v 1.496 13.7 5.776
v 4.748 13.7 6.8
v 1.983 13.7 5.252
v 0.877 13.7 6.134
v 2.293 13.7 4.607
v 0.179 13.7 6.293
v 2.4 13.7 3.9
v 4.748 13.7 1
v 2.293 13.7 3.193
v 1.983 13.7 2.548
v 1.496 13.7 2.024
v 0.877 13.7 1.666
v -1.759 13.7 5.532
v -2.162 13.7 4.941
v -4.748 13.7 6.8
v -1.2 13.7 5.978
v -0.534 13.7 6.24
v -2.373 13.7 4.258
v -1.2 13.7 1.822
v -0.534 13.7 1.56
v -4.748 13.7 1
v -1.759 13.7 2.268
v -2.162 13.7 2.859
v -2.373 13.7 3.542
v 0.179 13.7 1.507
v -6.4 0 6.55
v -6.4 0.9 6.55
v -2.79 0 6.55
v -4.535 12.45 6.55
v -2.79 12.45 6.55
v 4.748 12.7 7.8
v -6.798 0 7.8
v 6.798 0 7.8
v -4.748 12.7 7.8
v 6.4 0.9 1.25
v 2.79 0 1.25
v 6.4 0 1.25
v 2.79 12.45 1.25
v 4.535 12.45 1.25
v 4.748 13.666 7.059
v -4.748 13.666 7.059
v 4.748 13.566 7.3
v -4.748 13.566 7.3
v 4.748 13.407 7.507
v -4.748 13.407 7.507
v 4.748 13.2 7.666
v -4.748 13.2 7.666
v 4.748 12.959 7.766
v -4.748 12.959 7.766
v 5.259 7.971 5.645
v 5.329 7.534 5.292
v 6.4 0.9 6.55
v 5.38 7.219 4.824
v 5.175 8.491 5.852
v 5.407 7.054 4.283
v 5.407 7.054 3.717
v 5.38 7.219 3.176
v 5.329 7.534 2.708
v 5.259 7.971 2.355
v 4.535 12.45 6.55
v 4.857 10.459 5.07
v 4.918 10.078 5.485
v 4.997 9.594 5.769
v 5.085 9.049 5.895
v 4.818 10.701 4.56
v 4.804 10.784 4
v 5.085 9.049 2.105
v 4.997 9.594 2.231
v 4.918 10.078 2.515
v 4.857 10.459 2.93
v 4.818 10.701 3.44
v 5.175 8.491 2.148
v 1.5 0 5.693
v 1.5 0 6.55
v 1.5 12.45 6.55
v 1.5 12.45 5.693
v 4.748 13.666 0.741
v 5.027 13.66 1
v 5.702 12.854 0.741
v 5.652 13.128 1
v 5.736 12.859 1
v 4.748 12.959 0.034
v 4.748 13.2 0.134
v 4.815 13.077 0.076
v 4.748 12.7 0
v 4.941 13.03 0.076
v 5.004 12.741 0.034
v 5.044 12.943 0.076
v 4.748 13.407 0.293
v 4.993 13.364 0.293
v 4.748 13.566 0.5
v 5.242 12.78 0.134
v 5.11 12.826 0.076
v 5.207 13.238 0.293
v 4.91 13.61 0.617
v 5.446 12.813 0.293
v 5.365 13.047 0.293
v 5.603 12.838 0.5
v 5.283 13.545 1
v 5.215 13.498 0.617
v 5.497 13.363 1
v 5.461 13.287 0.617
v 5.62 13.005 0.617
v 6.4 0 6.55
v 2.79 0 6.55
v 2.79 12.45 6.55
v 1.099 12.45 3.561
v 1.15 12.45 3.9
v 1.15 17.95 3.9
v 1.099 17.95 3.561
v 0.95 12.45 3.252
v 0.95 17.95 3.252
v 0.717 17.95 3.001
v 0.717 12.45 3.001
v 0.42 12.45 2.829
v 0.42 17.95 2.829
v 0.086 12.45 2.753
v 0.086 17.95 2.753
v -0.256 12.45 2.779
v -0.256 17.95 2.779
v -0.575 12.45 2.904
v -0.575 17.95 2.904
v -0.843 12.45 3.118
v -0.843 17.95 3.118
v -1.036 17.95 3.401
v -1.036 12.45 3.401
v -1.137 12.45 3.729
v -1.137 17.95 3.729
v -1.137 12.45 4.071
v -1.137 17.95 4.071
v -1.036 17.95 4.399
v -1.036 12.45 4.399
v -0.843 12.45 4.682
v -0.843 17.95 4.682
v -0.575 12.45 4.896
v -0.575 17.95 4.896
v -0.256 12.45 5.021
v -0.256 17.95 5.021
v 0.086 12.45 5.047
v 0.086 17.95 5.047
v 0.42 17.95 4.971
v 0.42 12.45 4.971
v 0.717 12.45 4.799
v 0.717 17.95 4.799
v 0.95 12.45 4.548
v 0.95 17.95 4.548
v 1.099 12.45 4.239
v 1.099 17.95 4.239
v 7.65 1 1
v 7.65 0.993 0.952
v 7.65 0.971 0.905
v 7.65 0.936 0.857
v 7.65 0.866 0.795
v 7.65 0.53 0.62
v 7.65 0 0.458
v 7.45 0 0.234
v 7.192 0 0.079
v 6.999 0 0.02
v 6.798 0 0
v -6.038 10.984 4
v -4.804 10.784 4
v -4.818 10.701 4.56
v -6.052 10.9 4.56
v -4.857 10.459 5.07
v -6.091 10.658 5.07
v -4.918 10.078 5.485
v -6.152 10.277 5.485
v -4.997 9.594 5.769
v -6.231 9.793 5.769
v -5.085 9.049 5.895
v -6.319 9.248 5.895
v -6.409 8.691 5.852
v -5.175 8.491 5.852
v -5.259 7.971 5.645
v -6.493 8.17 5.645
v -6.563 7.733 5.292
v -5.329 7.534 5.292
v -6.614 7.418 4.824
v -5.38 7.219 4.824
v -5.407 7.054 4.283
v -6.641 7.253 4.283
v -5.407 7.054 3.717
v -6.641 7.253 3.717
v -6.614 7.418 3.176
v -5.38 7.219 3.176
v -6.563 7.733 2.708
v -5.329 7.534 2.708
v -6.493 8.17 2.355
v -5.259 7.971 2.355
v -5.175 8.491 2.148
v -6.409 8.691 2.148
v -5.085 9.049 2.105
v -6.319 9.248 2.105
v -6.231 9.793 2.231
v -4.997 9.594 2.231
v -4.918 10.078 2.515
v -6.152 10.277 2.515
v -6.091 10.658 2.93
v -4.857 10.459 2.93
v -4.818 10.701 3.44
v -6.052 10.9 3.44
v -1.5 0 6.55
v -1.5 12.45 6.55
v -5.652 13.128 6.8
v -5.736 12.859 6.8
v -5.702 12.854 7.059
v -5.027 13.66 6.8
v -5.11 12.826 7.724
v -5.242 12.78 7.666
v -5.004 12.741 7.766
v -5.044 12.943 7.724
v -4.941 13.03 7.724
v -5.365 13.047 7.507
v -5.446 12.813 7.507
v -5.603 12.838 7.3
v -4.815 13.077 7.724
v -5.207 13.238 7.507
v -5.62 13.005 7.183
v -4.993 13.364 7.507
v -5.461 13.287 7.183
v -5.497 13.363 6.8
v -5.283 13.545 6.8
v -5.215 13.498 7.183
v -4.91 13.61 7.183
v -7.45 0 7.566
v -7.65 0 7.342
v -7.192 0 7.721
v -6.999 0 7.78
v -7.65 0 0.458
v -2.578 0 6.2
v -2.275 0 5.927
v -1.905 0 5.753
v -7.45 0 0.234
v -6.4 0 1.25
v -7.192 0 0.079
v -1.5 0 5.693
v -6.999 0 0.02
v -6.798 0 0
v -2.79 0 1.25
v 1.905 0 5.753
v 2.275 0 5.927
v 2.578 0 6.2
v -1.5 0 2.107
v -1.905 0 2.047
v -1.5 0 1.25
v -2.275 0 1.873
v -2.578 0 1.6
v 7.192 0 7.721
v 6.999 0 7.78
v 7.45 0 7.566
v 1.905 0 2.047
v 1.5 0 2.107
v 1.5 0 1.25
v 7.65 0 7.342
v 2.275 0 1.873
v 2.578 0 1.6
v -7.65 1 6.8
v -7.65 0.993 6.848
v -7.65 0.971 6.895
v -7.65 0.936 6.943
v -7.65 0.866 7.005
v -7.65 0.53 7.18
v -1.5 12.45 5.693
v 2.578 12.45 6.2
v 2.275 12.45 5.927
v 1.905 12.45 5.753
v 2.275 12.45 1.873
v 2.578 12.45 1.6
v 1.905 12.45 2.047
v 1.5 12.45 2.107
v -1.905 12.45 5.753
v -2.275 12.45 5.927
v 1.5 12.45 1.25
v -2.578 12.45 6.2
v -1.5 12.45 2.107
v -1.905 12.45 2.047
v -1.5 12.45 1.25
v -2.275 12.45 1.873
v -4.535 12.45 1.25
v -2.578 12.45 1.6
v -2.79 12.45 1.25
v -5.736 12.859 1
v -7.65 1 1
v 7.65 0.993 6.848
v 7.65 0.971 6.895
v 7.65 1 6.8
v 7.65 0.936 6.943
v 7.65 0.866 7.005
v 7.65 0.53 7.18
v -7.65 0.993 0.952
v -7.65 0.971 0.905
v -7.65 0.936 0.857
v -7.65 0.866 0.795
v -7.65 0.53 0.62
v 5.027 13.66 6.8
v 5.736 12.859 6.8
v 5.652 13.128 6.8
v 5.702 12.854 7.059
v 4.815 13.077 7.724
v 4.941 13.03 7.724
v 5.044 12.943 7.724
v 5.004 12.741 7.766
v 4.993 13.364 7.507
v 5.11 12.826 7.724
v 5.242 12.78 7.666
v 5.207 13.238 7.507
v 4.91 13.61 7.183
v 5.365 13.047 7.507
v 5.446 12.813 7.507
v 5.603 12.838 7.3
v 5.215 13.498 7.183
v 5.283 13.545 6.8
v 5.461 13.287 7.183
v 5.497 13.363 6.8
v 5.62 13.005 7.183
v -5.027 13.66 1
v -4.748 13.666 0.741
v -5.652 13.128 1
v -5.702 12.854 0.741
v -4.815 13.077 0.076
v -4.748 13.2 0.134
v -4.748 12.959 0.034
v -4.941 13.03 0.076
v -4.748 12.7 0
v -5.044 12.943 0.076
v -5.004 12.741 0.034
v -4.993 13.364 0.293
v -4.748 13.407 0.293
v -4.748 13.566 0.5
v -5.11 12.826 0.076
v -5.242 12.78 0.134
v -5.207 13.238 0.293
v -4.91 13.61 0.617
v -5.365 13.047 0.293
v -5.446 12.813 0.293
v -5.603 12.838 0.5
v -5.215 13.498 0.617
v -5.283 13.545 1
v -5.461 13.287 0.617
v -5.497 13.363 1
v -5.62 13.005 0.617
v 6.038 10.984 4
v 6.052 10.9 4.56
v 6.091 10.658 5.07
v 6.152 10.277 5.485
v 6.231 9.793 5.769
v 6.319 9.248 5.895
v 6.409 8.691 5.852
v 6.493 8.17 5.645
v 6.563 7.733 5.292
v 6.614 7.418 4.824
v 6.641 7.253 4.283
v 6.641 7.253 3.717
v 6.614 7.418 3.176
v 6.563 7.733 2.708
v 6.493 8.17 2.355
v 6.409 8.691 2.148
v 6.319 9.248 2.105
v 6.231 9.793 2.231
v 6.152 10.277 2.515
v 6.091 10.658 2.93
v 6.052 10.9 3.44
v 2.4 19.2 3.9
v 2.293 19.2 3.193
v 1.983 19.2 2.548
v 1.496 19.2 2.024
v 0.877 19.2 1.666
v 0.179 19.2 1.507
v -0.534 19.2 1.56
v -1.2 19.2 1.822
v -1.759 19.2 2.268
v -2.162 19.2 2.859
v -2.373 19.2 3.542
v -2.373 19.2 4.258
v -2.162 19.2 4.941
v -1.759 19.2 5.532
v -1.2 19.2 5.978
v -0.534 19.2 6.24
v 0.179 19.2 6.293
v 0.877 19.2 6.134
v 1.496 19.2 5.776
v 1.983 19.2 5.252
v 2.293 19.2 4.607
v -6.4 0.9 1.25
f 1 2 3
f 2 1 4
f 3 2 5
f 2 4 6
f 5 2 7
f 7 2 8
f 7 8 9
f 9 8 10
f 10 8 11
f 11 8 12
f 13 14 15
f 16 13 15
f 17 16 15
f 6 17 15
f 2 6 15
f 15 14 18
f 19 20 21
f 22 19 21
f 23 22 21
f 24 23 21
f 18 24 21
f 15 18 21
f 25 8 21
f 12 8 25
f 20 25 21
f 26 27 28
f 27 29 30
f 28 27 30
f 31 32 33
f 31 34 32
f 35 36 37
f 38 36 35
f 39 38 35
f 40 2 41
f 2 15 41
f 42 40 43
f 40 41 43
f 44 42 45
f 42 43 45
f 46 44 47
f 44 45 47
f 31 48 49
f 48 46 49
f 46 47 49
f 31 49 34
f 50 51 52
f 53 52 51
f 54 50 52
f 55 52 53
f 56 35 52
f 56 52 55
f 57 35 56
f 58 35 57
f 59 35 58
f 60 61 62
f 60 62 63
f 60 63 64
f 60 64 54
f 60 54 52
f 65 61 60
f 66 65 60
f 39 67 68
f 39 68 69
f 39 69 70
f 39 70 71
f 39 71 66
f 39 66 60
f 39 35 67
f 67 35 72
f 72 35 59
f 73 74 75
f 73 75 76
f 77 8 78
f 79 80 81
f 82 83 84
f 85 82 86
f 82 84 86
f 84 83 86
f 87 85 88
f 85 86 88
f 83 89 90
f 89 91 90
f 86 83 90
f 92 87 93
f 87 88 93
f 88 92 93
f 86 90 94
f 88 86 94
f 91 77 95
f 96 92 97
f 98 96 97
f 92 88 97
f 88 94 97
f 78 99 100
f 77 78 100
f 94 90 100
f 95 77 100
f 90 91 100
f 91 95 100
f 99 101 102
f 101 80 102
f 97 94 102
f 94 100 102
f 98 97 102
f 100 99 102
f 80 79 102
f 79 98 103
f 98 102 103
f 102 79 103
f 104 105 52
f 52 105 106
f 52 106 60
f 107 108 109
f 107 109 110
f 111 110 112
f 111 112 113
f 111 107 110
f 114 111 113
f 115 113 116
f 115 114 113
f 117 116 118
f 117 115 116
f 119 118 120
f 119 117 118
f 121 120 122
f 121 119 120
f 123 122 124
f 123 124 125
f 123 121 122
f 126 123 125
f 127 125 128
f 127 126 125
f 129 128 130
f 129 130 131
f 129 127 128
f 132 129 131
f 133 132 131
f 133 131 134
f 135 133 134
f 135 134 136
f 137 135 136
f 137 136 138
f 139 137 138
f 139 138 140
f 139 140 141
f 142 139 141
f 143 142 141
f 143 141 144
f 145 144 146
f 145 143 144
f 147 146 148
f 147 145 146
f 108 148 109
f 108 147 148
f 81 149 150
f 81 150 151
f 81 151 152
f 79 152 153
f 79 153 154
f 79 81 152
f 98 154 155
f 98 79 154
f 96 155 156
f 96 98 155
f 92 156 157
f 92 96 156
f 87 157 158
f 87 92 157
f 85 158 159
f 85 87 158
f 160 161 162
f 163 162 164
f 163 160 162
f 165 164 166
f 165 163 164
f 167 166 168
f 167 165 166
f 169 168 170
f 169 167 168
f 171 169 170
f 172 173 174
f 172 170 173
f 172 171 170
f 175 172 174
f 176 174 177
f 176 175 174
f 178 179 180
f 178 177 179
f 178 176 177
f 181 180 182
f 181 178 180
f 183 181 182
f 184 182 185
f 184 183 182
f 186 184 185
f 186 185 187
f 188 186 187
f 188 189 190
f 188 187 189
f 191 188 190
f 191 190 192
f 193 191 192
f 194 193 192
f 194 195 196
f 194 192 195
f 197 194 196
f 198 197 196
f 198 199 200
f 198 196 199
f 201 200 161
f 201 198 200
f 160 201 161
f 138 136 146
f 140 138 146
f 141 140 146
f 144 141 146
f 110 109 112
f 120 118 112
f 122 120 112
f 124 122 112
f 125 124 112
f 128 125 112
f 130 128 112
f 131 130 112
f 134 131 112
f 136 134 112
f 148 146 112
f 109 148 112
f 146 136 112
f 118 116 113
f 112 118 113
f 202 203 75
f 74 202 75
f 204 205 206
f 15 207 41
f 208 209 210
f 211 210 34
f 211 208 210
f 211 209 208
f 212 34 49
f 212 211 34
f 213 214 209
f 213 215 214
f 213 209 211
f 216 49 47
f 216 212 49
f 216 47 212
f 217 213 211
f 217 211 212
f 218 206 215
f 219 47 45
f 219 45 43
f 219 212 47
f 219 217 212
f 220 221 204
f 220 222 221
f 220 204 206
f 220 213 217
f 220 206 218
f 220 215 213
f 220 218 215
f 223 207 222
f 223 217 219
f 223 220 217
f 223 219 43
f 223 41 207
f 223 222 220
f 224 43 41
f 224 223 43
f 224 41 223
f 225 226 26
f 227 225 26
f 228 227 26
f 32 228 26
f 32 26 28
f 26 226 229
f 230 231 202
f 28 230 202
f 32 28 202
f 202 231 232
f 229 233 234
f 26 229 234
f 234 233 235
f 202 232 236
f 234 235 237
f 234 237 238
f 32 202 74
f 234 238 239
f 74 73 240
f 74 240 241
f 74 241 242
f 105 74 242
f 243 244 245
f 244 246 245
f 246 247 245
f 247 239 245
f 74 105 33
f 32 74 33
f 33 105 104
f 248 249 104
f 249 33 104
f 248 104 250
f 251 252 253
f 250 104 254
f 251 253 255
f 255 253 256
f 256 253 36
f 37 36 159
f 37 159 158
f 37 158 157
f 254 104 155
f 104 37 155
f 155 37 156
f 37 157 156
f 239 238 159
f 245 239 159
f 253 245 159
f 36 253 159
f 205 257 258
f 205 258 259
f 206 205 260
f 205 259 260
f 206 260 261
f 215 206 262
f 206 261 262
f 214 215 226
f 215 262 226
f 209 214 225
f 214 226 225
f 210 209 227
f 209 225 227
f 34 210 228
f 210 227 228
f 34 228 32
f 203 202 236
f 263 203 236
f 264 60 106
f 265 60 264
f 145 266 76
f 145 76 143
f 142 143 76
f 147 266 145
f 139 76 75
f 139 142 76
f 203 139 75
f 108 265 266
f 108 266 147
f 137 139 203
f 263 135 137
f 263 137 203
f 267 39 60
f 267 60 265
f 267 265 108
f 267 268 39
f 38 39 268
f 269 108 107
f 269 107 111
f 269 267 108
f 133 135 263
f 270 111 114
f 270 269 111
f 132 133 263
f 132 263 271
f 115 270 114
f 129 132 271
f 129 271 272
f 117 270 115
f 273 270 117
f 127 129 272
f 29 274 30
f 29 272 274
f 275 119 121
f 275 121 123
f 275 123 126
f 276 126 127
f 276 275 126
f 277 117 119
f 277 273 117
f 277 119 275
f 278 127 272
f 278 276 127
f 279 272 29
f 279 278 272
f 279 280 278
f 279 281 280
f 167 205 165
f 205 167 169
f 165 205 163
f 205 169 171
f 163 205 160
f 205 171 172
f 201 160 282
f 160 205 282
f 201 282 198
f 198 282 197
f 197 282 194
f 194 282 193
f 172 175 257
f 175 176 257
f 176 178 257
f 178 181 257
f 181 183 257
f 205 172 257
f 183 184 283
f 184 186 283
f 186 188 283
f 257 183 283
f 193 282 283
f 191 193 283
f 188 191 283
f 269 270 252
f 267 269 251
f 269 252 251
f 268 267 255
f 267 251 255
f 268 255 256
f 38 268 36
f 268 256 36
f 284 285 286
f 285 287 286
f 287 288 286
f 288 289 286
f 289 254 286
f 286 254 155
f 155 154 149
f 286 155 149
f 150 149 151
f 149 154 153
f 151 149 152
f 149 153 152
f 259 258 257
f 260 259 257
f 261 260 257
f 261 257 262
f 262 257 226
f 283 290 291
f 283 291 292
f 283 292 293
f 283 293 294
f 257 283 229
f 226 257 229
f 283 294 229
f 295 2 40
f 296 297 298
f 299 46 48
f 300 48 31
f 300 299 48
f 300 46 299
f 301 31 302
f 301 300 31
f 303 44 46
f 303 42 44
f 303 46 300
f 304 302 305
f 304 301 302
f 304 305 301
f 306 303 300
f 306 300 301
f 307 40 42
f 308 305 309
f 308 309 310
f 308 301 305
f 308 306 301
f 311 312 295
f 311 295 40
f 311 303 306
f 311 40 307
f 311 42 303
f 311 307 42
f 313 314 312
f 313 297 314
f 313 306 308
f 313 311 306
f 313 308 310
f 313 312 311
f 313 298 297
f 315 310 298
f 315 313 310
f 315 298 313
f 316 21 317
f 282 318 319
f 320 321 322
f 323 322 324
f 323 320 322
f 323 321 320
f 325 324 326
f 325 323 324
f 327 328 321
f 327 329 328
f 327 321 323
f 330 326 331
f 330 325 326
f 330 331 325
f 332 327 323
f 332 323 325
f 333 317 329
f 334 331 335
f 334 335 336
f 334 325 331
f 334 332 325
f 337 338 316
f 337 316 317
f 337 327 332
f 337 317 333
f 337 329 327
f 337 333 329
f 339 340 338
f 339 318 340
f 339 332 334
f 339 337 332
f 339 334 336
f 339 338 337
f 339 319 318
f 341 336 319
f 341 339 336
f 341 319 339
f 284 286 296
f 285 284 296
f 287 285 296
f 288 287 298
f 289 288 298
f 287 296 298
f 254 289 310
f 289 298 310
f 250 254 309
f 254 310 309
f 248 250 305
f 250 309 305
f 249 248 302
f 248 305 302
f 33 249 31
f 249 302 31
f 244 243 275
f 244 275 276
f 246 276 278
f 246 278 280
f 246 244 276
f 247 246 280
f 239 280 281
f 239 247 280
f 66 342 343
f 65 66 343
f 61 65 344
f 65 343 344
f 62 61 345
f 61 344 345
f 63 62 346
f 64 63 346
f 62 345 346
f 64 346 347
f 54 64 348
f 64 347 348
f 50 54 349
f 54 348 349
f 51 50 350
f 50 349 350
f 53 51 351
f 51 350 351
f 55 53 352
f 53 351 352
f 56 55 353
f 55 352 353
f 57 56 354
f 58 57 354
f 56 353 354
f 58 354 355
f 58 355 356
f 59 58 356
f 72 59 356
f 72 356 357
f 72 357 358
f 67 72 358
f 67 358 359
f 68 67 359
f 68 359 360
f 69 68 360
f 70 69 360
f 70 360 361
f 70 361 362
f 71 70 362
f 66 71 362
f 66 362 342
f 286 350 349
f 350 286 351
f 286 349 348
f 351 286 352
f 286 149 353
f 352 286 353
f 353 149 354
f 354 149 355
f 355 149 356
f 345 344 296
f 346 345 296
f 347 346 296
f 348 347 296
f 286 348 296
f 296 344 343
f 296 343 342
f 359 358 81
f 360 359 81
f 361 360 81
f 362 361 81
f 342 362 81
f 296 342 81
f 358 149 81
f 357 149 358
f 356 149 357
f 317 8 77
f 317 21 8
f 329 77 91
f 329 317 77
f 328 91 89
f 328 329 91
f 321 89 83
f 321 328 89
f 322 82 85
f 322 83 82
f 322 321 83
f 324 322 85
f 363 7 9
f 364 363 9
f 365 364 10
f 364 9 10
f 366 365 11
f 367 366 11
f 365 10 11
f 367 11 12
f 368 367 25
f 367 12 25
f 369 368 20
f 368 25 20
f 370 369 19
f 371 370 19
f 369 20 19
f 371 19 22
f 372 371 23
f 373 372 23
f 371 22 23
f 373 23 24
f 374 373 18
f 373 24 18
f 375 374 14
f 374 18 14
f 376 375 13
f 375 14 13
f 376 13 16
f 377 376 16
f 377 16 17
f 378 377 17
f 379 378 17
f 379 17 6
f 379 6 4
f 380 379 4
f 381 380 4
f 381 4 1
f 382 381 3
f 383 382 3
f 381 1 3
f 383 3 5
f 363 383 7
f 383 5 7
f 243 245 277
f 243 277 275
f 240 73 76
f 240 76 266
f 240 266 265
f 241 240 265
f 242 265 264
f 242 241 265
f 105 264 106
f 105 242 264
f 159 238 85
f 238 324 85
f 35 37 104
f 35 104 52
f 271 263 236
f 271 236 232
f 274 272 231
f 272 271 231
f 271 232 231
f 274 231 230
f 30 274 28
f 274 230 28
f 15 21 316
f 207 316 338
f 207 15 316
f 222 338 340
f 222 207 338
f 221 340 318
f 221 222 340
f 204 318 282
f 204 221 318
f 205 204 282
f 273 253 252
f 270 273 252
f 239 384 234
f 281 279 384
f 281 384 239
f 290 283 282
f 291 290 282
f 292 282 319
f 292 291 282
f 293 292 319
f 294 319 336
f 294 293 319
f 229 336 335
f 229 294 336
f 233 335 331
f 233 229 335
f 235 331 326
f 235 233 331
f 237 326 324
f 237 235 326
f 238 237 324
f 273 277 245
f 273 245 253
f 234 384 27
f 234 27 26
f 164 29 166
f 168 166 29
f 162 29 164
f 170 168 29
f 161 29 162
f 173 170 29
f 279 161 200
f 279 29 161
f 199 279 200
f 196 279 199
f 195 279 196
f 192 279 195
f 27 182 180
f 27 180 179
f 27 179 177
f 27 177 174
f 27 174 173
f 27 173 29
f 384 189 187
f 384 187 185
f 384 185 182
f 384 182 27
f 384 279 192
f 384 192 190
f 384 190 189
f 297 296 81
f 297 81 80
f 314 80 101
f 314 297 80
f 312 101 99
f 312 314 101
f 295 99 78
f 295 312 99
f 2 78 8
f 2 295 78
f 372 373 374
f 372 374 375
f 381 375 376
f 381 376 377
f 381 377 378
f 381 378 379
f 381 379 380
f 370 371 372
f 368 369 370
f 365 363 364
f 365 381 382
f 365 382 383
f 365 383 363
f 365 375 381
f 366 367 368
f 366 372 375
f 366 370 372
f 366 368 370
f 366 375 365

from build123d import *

# Parameters (mm, degrees)
BOSS_EXTRUDE1_DEPTH = 7.8
FILLET1_R           = 1
SKETCH3_R           = 2.4
BOSS_EXTRUDE2_DEPTH = 5.5
SHELL3_START        = 1.25
SHELL3_DEPTH        = 5.3
SHELL3_START_2      = 12.45
SHELL3_2_OUTLINE_R  = 1.15
SHELL3_2_DEPTH      = 5.5
SKETCH7_R           = 1.9
CUT_EXTRUDE5_DEPTH  = 2
BOSS_EXTRUDE3_REACH = 24.091


with BuildPart() as part:
    # Sketch2 → Boss-Extrude1 (new body)
    with BuildSketch(Plane.XY):
        Polygon((-7.65, 0), (7.65, 0), (7.65, 1), (5.599872407, 13.7), (2.399872407, 13.7), (-2.399872407, 13.7), (-5.599872407, 13.7), (-7.65, 1), align=None)
    extrude(amount=BOSS_EXTRUDE1_DEPTH)

    # Fillet1
    fillet1_edges = [part.edges().sort_by_distance(p)[0] for p in [
        (5.599872407, 13.7, 3.9),
        (0, 13.7, 7.8),
        (-5.599872407, 13.7, 3.9),
        (0, 13.7, 0),
        (6.624936203, 7.35, 0),
        (6.624936203, 7.35, 7.8),
        (-6.624936203, 7.35, 7.8),
        (-6.624936203, 7.35, 0),
    ]]
    fillet(fillet1_edges, radius=FILLET1_R)

    # Sketch3 → Boss-Extrude2 (add)
    with BuildSketch(Plane(origin=(0, 13.7, 0), x_dir=(1, 0, 0), z_dir=(0, 1, 0))):
        with Locations((0, -3.9)):
            Circle(SKETCH3_R)
    extrude(amount=BOSS_EXTRUDE2_DEPTH)

    # Shell3: read off the stored shape, not the designer's step
    # Shell3 outline → Shell3 (cut)
    with BuildSketch(Plane.XY.offset(SHELL3_START)):
        Polygon((6.4, 0), (6.4, 0.899756749), (4.535474615, 12.45), (-4.535474615, 12.45), (-6.4, 0.899756749), (-6.4, 0), align=None)
    extrude(amount=SHELL3_DEPTH, mode=Mode.SUBTRACT)

    # Shell3 2 outline → Shell3 2 (cut)
    with BuildSketch(Plane(origin=(0, 0, 0), x_dir=(1, 0, 0), z_dir=(0, 1, 0)).offset(SHELL3_START_2)):
        with Locations((0, -3.9)):
            Circle(SHELL3_2_OUTLINE_R)
    extrude(amount=SHELL3_2_DEPTH, mode=Mode.SUBTRACT)

    # Sketch7 → Cut-Extrude5 (cut)
    with BuildSketch(Plane(origin=(7.613040698, 1.228953134, 0), x_dir=(0, 0, -1), z_dir=(0.987219843348776, 0.15936430245954794, 0))):
        with Locations(Location((-4, 7.98097386, 0), (0, 0, 90))):
            Circle(SKETCH7_R)
    cut_extrude5 = extrude(amount=-CUT_EXTRUDE5_DEPTH, mode=Mode.SUBTRACT)

    # Mirror1: Cut-Extrude5 across plane
    add(cut_extrude5.mirror(Plane(origin=(0, 0, 0), x_dir=(0, 0, 1), z_dir=(1, 0, 0))), mode=Mode.SUBTRACT)

    # Sketch8 → Boss-Extrude3 (add, up to next)
    with BuildSketch(Plane.XZ, mode=Mode.PRIVATE) as boss_extrude3_sk1:
        with BuildLine():
            Line((1.5, 6.55), (1.5, 5.692944235))
            ThreePointArc((1.5, 5.692944235), (2.274557316, 5.926727718), (2.790430764, 6.55))
            Line((2.790430764, 6.55), (1.5, 6.55))
        make_face()
    boss_extrude3_tool1 = extrude(boss_extrude3_sk1.sketch, amount=-BOSS_EXTRUDE3_REACH, mode=Mode.PRIVATE) - part.part
    # Sketch8 → Boss-Extrude3 (add, up to next)
    with BuildSketch(Plane.XZ, mode=Mode.PRIVATE) as boss_extrude3_sk2:
        with BuildLine():
            Line((-1.5, 6.55), (-1.5, 5.692944235))
            ThreePointArc((-1.5, 5.692944235), (-2.274557316, 5.926727718), (-2.790430764, 6.55))
            Line((-2.790430764, 6.55), (-1.5, 6.55))
        make_face()
    boss_extrude3_tool2 = extrude(boss_extrude3_sk2.sketch, amount=-BOSS_EXTRUDE3_REACH, mode=Mode.PRIVATE) - part.part
    # Sketch8 → Boss-Extrude3 (add, up to next)
    with BuildSketch(Plane.XZ, mode=Mode.PRIVATE) as boss_extrude3_sk3:
        with BuildLine():
            Line((1.5, 1.25), (1.5, 2.107055765))
            ThreePointArc((1.5, 2.107055765), (2.274557316, 1.873272282), (2.790430764, 1.25))
            Line((2.790430764, 1.25), (1.5, 1.25))
        make_face()
    boss_extrude3_tool3 = extrude(boss_extrude3_sk3.sketch, amount=-BOSS_EXTRUDE3_REACH, mode=Mode.PRIVATE) - part.part
    # Sketch8 → Boss-Extrude3 (add, up to next)
    with BuildSketch(Plane.XZ, mode=Mode.PRIVATE) as boss_extrude3_sk4:
        with BuildLine():
            Line((-1.5, 1.25), (-1.5, 2.107055765))
            ThreePointArc((-1.5, 2.107055765), (-2.274557316, 1.873272282), (-2.790430764, 1.25))
            Line((-2.790430764, 1.25), (-1.5, 1.25))
        make_face()
    boss_extrude3_tool4 = extrude(boss_extrude3_sk4.sketch, amount=-BOSS_EXTRUDE3_REACH, mode=Mode.PRIVATE) - part.part
    add(boss_extrude3_tool1.solids().sort_by_distance((2.012361, 0, 6.196212))[0])
    add(boss_extrude3_tool2.solids().sort_by_distance((-2.012361, 0, 6.196212))[0])
    add(boss_extrude3_tool3.solids().sort_by_distance((2.012361, 0, 1.603788))[0])
    add(boss_extrude3_tool4.solids().sort_by_distance((-2.012361, 0, 1.603788))[0])


solid = part.part
